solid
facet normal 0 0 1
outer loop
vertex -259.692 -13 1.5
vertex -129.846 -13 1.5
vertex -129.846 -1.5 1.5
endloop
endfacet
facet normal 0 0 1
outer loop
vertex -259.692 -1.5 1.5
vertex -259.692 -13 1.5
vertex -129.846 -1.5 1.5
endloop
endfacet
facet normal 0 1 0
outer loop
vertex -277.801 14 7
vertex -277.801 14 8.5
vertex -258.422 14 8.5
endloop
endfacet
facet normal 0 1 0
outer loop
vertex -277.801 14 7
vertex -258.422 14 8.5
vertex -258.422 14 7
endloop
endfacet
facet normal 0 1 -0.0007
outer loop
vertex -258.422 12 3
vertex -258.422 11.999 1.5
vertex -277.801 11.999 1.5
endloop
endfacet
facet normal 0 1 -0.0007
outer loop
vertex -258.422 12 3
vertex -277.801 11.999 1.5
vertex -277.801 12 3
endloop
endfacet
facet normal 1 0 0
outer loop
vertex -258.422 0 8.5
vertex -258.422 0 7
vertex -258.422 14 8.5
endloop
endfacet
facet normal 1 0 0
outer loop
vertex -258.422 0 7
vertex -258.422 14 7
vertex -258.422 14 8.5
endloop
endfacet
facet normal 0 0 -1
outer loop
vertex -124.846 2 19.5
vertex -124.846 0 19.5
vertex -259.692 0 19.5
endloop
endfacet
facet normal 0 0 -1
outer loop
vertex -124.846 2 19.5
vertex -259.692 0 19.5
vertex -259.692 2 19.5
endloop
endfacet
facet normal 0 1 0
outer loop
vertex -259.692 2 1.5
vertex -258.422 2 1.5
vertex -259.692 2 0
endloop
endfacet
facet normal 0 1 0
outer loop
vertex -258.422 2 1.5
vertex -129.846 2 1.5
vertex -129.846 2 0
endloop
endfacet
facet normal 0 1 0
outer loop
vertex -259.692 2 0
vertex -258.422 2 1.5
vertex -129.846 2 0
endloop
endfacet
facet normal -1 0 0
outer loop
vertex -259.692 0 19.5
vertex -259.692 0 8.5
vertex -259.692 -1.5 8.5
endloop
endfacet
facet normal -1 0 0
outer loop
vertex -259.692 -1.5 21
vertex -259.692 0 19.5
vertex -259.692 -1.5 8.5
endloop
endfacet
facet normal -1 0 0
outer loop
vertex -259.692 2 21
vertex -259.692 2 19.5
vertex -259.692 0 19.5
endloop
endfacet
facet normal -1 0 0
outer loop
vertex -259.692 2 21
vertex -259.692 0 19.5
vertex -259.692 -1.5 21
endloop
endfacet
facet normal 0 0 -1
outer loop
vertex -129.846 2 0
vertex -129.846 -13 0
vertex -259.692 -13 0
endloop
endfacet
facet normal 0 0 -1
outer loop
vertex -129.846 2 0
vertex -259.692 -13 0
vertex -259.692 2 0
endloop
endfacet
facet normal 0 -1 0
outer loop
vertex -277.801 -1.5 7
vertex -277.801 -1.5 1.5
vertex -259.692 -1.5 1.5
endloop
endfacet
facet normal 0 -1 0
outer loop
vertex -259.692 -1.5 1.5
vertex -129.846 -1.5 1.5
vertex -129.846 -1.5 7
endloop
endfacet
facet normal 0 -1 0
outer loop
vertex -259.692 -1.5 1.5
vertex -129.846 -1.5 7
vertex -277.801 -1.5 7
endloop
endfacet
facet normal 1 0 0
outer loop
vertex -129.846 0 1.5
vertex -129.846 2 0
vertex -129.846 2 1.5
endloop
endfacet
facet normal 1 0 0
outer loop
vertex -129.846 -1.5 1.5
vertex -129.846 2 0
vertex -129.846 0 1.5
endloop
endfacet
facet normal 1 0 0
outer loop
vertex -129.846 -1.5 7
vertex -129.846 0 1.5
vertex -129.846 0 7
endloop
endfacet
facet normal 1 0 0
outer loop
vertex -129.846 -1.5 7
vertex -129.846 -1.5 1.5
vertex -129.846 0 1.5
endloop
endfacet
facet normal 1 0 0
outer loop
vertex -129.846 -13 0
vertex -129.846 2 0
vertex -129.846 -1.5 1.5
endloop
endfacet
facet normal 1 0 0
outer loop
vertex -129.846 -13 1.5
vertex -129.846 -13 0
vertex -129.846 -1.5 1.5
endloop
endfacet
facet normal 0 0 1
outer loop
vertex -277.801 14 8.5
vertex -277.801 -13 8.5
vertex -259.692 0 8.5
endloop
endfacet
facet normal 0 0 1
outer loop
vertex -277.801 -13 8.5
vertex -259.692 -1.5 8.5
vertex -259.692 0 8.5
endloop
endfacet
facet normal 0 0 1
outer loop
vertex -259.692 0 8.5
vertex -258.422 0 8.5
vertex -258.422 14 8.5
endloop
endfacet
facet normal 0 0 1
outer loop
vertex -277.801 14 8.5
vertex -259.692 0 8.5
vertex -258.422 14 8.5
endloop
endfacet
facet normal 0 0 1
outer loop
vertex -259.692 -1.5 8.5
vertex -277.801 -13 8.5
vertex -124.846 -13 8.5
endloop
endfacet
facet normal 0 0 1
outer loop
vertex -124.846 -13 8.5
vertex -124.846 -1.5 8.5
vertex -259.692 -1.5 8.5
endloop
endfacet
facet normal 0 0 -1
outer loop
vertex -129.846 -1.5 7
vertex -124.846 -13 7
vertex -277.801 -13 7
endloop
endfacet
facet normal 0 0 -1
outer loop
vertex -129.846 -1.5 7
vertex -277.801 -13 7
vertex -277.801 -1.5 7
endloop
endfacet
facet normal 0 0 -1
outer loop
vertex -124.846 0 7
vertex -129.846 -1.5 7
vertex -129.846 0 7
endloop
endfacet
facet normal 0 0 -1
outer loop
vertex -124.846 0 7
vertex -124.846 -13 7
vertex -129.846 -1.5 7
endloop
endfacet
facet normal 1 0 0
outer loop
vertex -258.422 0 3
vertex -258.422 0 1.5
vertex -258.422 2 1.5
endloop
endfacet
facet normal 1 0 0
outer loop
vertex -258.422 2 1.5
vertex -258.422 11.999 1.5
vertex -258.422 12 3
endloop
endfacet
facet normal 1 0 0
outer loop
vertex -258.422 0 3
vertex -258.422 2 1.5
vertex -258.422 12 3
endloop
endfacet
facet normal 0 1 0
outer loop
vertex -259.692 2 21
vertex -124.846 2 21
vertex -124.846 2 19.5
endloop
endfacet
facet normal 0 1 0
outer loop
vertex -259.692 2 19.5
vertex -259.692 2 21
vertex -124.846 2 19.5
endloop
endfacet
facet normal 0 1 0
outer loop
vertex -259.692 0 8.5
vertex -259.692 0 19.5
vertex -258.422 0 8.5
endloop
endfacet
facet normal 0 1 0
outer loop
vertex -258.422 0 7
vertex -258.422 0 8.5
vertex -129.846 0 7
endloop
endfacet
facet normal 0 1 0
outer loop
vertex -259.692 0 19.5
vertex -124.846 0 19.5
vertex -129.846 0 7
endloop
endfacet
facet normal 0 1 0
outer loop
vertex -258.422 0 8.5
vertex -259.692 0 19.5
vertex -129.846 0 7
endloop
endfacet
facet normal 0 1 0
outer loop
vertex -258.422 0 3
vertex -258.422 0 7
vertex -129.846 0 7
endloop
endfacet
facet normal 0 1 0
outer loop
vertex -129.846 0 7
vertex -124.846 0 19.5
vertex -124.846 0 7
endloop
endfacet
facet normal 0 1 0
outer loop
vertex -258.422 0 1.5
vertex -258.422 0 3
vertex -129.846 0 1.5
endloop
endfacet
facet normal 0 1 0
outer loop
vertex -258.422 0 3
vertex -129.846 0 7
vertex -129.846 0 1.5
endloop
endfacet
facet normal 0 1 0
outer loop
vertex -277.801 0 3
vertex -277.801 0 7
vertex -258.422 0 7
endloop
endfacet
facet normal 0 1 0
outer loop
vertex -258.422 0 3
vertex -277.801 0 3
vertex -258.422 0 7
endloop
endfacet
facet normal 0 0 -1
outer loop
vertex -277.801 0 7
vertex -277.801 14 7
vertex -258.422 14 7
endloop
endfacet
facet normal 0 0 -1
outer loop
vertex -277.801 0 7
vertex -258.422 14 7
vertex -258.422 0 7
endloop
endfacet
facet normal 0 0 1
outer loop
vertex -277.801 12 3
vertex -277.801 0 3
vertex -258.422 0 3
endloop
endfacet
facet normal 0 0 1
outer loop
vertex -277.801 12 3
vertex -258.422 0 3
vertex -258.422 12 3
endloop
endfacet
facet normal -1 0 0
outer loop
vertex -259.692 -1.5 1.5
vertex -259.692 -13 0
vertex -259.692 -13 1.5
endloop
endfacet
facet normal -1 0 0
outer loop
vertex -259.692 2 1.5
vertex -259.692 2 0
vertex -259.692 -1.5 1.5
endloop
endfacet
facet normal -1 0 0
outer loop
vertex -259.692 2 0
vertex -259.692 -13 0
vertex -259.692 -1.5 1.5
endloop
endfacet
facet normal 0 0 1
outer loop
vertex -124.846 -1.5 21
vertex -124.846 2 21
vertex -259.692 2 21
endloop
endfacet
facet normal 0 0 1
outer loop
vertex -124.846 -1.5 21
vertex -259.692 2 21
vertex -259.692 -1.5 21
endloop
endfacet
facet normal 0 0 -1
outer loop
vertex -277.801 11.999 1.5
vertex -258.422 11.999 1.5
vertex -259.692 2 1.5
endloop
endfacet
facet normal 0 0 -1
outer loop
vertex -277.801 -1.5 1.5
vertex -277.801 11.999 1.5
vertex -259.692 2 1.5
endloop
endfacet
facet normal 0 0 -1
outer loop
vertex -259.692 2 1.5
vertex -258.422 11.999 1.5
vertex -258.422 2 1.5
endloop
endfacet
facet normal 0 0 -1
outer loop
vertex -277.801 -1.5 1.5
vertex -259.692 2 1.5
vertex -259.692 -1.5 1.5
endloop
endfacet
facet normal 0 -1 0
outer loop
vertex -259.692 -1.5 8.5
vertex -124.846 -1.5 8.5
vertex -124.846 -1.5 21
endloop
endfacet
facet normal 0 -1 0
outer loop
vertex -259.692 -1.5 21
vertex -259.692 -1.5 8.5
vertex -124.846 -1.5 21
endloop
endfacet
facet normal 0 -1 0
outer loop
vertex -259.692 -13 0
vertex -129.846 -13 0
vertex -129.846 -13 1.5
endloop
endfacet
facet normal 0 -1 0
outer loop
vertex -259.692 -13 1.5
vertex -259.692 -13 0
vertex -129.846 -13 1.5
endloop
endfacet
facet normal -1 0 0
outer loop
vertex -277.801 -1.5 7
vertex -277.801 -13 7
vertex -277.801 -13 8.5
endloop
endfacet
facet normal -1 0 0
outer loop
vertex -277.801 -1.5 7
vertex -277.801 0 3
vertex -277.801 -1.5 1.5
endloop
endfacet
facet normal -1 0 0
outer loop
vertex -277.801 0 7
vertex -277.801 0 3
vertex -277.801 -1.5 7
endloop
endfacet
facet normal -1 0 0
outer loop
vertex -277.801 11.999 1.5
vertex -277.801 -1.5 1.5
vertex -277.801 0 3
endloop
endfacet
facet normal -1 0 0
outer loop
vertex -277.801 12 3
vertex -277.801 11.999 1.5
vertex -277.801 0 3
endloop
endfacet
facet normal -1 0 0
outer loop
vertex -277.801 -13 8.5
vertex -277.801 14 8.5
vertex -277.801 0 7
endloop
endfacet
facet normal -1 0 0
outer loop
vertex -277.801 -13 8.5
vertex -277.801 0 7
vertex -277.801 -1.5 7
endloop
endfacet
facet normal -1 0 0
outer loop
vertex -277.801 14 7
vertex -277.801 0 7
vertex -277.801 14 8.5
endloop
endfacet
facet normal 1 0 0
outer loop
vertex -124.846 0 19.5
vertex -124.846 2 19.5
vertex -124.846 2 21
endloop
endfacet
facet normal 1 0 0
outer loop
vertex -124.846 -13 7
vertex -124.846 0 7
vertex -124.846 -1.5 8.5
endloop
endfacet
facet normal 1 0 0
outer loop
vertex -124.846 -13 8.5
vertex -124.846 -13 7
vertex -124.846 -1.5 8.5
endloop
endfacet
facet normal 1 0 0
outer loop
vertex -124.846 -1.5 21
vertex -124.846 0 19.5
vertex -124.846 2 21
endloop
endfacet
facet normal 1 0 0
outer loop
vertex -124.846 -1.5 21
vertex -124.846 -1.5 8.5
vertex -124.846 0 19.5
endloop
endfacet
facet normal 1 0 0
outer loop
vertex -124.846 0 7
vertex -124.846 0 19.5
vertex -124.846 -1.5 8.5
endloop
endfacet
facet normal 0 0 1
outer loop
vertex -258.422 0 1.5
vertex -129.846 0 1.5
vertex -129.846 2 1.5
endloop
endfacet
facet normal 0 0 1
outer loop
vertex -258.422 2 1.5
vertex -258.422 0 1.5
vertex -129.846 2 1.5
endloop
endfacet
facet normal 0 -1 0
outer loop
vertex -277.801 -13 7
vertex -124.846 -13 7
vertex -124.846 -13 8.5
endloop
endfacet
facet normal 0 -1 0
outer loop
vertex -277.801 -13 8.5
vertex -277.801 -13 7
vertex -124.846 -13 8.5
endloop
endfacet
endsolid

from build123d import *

# Parameters (mm, degrees)
SKETCH1_W                = 1.5
SKETCH1_H                = 2
BOSS_EXTRUDE1_DEPTH      = 259.69214
RIGHT_EAR_DEPTH          = 1.27
RIGHT_EAR_DEPTH_BACK     = 24.45893
SKETCH9_W                = 1.5
SKETCH9_H                = 11.5
LEFT_EAR_DEPTH           = 18.10893
LEFT_EAR_DEPTH_BACK      = 1.27
CUT_EXTRUDE6_DEPTH       = 280.89897194
CUT_EXTRUDE6_DEPTH_BACK  = 280.89897194
SURFACE_EXTRUDE1_1_BACK  = 307.34
SURFACE_EXTRUDE1_1_DEPTH = 308.93893
SURFACE_EXTRUDE1_2_BACK  = 307.34
SURFACE_EXTRUDE1_2_DEPTH = 308.93893
CUT_EXTRUDE7_DEPTH       = 157.732995968


with BuildPart() as part:
    # Sketch1 → Boss-Extrude1 (new body)
    with BuildSketch(Plane(origin=(0, 0, 0), x_dir=(0, 0, -1), z_dir=(1, 0, 0))):
        Polygon((-21, 0), (0, 0), (0, -13), (-1.5, -13), (-1.5, -1.5), (-7, -1.5), (-7, -13), (-8.5, -13), (-8.5, -1.5), (-21, -1.5), align=None)
        with Locations((-20.25, 1)):
            Rectangle(SKETCH1_W, SKETCH1_H)
        with Locations((-0.75, 1)):
            Rectangle(SKETCH1_W, SKETCH1_H)
    extrude(amount=-BOSS_EXTRUDE1_DEPTH)


with BuildPart() as body_2:
    # Mirror3: mirrored copy
    add(part.part.mirror(Plane.ZX.offset(7)))


with BuildPart() as part_1:
    add(part.part)

    add(body_2.part)  # right_ear merges body 2
    # Sketch9 → right_ear (add, two sides: drawn at the far end of the back side and taken through both)
    with BuildSketch(Plane.ZY.offset(-RIGHT_EAR_DEPTH_BACK)):
        with Locations((7.75, -7.25)):
            Rectangle(SKETCH9_W, SKETCH9_H)
        Polygon((1.5, -1.5), (7, -1.5), (8.5, -1.5), (8.5, 15.5), (7, 15.5), (1.5, 15.5), align=None)
        with Locations((7.75, 21.25)):
            Rectangle(SKETCH9_W, SKETCH9_H)
    extrude(amount=RIGHT_EAR_DEPTH + RIGHT_EAR_DEPTH_BACK)

    # Sketch12 → left_ear (add, two sides: drawn at the far end of the back side and taken through both)
    with BuildSketch(Plane.ZY.offset(259.69214).offset(-LEFT_EAR_DEPTH_BACK)):
        Polygon((8.5, -13), (8.5, 27), (7, 27), (7, 15.5), (1.5, 15.5), (1.5, -1.5), (7, -1.5), (7, -13), align=None)
    extrude(amount=LEFT_EAR_DEPTH + LEFT_EAR_DEPTH_BACK)

    # Sketch10<3> → Cut-Extrude6 (cut, two sides: drawn at the far end of the back side and taken through both)
    with BuildSketch(Plane(origin=(0, 0, 0), x_dir=(1, 0, 0), z_dir=(0, 1, 0)).offset(-CUT_EXTRUDE6_DEPTH_BACK)):
        Polygon((-1.27, -1.5), (-129.84607, -1.5), (-129.84607, -7), (-124.84607, -7), (-124.84607, -19.5), (0, -19.5), (0, -8.5), (-1.27, -8.5), align=None)
        Polygon((-129.84607, 5.228694749), (-129.84607, 0), (-129.84607, -1.5), (-1.27, -1.5), (-1.27, -8.5), (0, -8.5), (0, -19.5), (-124.84607, -19.5), (-124.84607, -21), (-124.84607, -30.387985995), (75.346094687, -30.387985995), (75.346094687, 5.228694749), align=None)
    extrude(amount=CUT_EXTRUDE6_DEPTH + CUT_EXTRUDE6_DEPTH_BACK, mode=Mode.SUBTRACT)


with BuildPart() as body_2_2:
    # L-Split2: the piece behind the surface
    add(part_1.part)
    # Surface-Extrude1: a surface, the sketch's curves swept straight by 308.93893 mm
    with BuildLine(Plane(origin=(24.45893, 0, 0), x_dir=(0, 0, -1), z_dir=(1, 0, 0)).offset(-SURFACE_EXTRUDE1_1_BACK), mode=Mode.PRIVATE) as surface_extrude1_1_path:
        Line((-19.5, 14), (-7, 14))
        Line((-7, 14), (-7, 0))
        Line((-7, 0), (-3, 0))
        Line((-3, 0), (-3, 12))
        Line((-3, 12), (0, 12))
    surface_extrude1_1 = Shell.extrude(surface_extrude1_1_path.wire(), (1 * SURFACE_EXTRUDE1_1_DEPTH, 0 * SURFACE_EXTRUDE1_1_DEPTH, 0 * SURFACE_EXTRUDE1_1_DEPTH))
    split(bisect_by=surface_extrude1_1, keep=Keep.BOTTOM)


with BuildPart() as part_2:
    add(part_1.part)

    # L-Split2: split by a surface, the side it looks to stays
    # Surface-Extrude1: a surface, the sketch's curves swept straight by 308.93893 mm
    with BuildLine(Plane(origin=(24.45893, 0, 0), x_dir=(0, 0, -1), z_dir=(1, 0, 0)).offset(-SURFACE_EXTRUDE1_2_BACK), mode=Mode.PRIVATE) as surface_extrude1_2_path:
        Line((-19.5, 14), (-7, 14))
        Line((-7, 14), (-7, 0))
        Line((-7, 0), (-3, 0))
        Line((-3, 0), (-3, 12))
        Line((-3, 12), (0, 12))
    surface_extrude1_2 = Shell.extrude(surface_extrude1_2_path.wire(), (1 * SURFACE_EXTRUDE1_2_DEPTH, 0 * SURFACE_EXTRUDE1_2_DEPTH, 0 * SURFACE_EXTRUDE1_2_DEPTH))
    split(bisect_by=surface_extrude1_2, keep=Keep.TOP)


with BuildPart() as cut_extrude7_tool:
    # Sketch14 → Cut-Extrude7 (new, through all)
    with BuildSketch(Plane.ZY.offset(277.80107)):
        Polygon((-4.726079356, 11.992451092), (3, 12), (3, 0), (7, 0), (7, 14), (19.5, 14), (19.5, 12), (27.004136279, 12), (27.004136279, 32.441536758), (-4.726079356, 32.441536758), align=None)
    extrude(amount=-CUT_EXTRUDE7_DEPTH)


with BuildPart() as part_3:
    add(part_2.part)

    # Cut-Extrude7: cut by cut_extrude7_tool
    add(cut_extrude7_tool.part, mode=Mode.SUBTRACT)


with BuildPart() as body_2_2_1:
    add(body_2_2.part)

    # Cut-Extrude7: cut by cut_extrude7_tool
    add(cut_extrude7_tool.part, mode=Mode.SUBTRACT)


solid = body_2_2_1.part
